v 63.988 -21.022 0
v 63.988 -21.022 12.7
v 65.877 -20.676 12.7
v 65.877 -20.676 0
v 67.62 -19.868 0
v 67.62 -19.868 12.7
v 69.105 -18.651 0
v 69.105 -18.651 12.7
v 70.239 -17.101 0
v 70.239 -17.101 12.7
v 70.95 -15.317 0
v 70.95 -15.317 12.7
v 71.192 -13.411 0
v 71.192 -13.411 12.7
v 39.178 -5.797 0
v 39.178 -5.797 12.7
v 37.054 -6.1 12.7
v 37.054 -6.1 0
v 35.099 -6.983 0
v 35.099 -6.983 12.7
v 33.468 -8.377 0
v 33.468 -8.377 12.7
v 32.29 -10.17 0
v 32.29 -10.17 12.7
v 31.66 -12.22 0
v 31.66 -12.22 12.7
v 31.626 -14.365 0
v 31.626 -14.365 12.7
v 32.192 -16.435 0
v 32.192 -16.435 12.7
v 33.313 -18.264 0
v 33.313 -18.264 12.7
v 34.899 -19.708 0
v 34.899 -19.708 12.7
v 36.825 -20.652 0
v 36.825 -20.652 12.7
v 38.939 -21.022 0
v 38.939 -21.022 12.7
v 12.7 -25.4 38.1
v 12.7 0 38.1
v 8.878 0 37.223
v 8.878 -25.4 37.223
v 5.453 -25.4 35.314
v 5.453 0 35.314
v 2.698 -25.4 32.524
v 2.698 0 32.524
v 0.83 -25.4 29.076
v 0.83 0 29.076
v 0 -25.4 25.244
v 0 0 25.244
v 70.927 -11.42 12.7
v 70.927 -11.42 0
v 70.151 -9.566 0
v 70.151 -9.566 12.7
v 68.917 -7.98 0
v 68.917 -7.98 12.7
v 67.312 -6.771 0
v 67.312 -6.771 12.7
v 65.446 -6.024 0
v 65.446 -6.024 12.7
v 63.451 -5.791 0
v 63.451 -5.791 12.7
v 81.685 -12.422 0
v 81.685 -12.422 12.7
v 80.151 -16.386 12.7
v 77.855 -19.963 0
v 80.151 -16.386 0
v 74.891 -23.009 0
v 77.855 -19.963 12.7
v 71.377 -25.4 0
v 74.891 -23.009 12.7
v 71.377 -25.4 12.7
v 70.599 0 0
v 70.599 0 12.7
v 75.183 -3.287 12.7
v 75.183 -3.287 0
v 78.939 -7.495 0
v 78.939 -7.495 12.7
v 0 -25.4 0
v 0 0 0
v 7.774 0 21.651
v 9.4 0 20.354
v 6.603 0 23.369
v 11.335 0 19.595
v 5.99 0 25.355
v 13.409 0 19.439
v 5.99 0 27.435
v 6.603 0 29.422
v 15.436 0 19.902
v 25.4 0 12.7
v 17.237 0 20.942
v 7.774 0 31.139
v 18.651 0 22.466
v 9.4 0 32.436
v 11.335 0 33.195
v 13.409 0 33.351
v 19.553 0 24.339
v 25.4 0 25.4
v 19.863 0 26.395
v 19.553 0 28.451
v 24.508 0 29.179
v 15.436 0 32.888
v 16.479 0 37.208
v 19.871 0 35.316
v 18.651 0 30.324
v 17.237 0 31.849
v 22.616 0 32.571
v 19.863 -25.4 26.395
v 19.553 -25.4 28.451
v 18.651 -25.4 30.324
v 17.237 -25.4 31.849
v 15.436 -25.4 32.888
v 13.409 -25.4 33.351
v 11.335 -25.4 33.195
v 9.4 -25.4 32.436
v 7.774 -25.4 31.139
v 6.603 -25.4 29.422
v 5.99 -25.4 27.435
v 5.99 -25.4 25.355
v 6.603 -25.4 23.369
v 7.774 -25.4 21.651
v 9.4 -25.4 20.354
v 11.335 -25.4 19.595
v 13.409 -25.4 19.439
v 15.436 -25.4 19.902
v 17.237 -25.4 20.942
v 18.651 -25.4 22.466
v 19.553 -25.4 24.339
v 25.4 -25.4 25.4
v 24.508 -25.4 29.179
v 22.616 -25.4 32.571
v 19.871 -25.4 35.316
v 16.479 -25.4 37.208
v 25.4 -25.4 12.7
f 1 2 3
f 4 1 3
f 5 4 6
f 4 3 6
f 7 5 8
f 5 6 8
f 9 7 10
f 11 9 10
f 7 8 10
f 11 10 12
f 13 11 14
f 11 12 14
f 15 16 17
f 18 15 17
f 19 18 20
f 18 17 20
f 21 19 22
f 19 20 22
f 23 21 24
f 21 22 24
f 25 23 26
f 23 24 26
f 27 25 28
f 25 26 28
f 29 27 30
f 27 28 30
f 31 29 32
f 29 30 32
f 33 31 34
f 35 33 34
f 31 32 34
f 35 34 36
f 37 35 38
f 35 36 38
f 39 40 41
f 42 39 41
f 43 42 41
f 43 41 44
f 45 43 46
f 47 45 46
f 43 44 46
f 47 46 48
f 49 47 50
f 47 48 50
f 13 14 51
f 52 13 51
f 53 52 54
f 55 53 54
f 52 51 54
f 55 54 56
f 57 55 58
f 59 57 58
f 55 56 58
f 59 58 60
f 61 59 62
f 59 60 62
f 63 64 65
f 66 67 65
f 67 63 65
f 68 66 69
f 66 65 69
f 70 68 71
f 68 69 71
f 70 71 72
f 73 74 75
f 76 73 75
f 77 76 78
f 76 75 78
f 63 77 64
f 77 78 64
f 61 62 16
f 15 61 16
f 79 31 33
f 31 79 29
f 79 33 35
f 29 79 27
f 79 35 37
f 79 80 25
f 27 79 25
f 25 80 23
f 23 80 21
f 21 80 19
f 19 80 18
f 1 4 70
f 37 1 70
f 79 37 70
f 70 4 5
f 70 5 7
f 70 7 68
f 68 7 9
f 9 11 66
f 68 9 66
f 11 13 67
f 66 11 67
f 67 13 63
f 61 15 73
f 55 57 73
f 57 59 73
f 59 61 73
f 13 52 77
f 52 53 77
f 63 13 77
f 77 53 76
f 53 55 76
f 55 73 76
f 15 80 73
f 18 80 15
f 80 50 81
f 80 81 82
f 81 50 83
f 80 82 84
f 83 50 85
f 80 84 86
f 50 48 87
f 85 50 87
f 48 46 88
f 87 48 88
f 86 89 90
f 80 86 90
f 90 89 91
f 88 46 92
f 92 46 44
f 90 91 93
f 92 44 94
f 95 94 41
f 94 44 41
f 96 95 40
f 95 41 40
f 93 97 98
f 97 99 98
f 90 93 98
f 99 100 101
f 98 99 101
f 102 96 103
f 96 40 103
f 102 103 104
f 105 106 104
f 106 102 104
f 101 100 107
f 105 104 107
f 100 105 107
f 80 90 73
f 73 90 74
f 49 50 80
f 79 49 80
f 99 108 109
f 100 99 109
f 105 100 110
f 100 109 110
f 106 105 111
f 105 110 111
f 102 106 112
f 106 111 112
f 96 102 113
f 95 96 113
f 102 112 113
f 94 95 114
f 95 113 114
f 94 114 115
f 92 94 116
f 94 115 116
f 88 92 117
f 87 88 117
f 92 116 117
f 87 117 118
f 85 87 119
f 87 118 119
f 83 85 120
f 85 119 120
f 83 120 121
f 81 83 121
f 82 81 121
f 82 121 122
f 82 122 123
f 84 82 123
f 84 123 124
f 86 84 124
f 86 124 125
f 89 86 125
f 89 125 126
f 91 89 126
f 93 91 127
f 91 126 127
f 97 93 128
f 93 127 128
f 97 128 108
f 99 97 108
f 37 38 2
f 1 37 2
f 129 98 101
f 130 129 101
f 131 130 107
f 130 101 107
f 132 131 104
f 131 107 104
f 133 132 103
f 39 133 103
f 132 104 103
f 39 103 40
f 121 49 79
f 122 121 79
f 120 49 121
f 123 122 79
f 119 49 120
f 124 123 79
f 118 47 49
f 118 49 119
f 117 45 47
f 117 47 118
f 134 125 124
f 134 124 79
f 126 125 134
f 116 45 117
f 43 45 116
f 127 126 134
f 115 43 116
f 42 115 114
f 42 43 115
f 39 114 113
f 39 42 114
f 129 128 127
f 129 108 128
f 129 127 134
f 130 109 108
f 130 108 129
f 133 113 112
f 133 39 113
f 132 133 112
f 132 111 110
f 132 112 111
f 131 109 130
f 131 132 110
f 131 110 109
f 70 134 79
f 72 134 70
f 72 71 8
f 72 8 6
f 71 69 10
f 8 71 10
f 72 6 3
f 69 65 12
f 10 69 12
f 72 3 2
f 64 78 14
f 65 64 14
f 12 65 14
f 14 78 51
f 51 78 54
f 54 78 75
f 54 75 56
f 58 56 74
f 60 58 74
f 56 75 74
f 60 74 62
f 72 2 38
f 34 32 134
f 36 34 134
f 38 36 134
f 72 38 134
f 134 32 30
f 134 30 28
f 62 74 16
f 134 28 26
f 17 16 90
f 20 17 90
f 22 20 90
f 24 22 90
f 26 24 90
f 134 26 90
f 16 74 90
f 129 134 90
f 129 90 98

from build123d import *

# Parameters (mm, degrees)
F1_DEPTH = 25.4
F3_DEPTH = 25.4
F4_R     = 6.9752629403
F5_DEPTH = 25.4
F7_DEPTH = 25.4
F9_DEPTH = 25.4


with BuildPart() as f1:
    # F0 (on Front) → F1 (new body)
    with BuildSketch(Plane.XZ):
        with BuildLine():
            Line((0, 25.2437964082), (0, 0))
            Line((0, 0), (82.55, 0))
            Line((82.55, 0), (82.55, 12.7))
            Line((82.55, 12.7), (25.4, 12.7))
            Line((25.4, 12.7), (25.4, 25.4))
            ThreePointArc((25.4, 25.4), (21.338721964, 34.038721964), (12.7, 38.1))
            ThreePointArc((12.7, 38.1), (3.9765521081, 34.0165085715), (0, 25.2437964082))
        make_face()
    extrude(amount=F1_DEPTH)

    # F2 (on face) → F3 (cut)
    with BuildSketch(Plane.XY.offset(12.7)):
        with BuildLine():
            ThreePointArc((70.5987364054, 0), (78.1138192484, -4.9013082489), (82.55, -12.7))
            Line((82.55, -12.7), (82.55, 0))
            Line((82.55, 0), (70.5987364054, 0))
        make_face()
        with BuildLine():
            Line((82.55, -25.4), (82.55, -12.7))
            ThreePointArc((82.55, -12.7), (78.6112135374, -20.4997420186), (71.376748383, -25.4))
            Line((71.376748383, -25.4), (82.55, -25.4))
        make_face()
    extrude(amount=-F3_DEPTH, mode=Mode.SUBTRACT)

    # F4 (on face) → F5 (cut)
    with BuildSketch(Plane.XZ.offset(25.4)):
        with Locations((12.887516059, 26.3950787485)):
            Circle(F4_R)
    extrude(amount=-F5_DEPTH, mode=Mode.SUBTRACT)

    # F6 (on face) → F7 (cut)
    with BuildSketch(Plane.XY.offset(12.7)):
        with BuildLine():
            ThreePointArc((46.7944949583, -13.4114921093), (44.5635810438, -8.0266435433), (39.1781151252, -5.7972203415))
            ThreePointArc((39.1781151252, -5.7972203415), (31.5668924837, -13.2917465926), (38.938654761, -21.0219312446))
            Line((38.938654761, -21.0219312446), (39.4217910365, -21.0219312446))
            ThreePointArc((39.4217910365, -21.0219312446), (44.6490666759, -18.7094999177), (46.7944949583, -13.4114921093))
        make_face()
        with BuildLine():
            ThreePointArc((63.1514803528, -21.0219312446), (55.9492219457, -13.2618150882), (63.4506483721, -5.7905012482))
            Line((63.4506483721, -5.7905012482), (39.1781151252, -5.7972203415))
            ThreePointArc((39.1781151252, -5.7972203415), (44.5635810438, -8.0266435433), (46.7944949583, -13.4114921093))
            ThreePointArc((46.7944949583, -13.4114921093), (44.6490666759, -18.7094999177), (39.4217910365, -21.0219312446))
            Line((39.4217910365, -21.0219312446), (63.1514803528, -21.0219312446))
        make_face()
        with BuildLine():
            ThreePointArc((63.9878644586, -21.0219312446), (69.1050628574, -18.6510647038), (71.1915926641, -13.4114921093))
            ThreePointArc((71.1915926641, -13.4114921093), (68.9169369742, -7.9800622737), (63.4506483721, -5.7905012482))
            ThreePointArc((63.4506483721, -5.7905012482), (55.9492219457, -13.2618150882), (63.1514803528, -21.0219312446))
            Line((63.1514803528, -21.0219312446), (63.9878644586, -21.0219312446))
        make_face()
    extrude(amount=-F7_DEPTH, mode=Mode.SUBTRACT)

    # F8 (on face) → F9 (cut)
    with BuildSketch(Plane.XY.offset(12.7)):
        with BuildLine():
            ThreePointArc((70.5987364054, 0), (77.1764816954, -5.287668523), (81.6851109266, -12.4219823629))
            ThreePointArc((81.6851109266, -12.4219823629), (77.8552746278, -19.9629105497), (71.376748383, -25.4))
            ThreePointArc((71.376748383, -25.4), (78.6112135374, -20.4997420186), (82.55, -12.7))
            ThreePointArc((82.55, -12.7), (78.1138192484, -4.9013082489), (70.5987364054, 0))
        make_face()
    extrude(amount=-F9_DEPTH, mode=Mode.SUBTRACT)


solid = f1.part
